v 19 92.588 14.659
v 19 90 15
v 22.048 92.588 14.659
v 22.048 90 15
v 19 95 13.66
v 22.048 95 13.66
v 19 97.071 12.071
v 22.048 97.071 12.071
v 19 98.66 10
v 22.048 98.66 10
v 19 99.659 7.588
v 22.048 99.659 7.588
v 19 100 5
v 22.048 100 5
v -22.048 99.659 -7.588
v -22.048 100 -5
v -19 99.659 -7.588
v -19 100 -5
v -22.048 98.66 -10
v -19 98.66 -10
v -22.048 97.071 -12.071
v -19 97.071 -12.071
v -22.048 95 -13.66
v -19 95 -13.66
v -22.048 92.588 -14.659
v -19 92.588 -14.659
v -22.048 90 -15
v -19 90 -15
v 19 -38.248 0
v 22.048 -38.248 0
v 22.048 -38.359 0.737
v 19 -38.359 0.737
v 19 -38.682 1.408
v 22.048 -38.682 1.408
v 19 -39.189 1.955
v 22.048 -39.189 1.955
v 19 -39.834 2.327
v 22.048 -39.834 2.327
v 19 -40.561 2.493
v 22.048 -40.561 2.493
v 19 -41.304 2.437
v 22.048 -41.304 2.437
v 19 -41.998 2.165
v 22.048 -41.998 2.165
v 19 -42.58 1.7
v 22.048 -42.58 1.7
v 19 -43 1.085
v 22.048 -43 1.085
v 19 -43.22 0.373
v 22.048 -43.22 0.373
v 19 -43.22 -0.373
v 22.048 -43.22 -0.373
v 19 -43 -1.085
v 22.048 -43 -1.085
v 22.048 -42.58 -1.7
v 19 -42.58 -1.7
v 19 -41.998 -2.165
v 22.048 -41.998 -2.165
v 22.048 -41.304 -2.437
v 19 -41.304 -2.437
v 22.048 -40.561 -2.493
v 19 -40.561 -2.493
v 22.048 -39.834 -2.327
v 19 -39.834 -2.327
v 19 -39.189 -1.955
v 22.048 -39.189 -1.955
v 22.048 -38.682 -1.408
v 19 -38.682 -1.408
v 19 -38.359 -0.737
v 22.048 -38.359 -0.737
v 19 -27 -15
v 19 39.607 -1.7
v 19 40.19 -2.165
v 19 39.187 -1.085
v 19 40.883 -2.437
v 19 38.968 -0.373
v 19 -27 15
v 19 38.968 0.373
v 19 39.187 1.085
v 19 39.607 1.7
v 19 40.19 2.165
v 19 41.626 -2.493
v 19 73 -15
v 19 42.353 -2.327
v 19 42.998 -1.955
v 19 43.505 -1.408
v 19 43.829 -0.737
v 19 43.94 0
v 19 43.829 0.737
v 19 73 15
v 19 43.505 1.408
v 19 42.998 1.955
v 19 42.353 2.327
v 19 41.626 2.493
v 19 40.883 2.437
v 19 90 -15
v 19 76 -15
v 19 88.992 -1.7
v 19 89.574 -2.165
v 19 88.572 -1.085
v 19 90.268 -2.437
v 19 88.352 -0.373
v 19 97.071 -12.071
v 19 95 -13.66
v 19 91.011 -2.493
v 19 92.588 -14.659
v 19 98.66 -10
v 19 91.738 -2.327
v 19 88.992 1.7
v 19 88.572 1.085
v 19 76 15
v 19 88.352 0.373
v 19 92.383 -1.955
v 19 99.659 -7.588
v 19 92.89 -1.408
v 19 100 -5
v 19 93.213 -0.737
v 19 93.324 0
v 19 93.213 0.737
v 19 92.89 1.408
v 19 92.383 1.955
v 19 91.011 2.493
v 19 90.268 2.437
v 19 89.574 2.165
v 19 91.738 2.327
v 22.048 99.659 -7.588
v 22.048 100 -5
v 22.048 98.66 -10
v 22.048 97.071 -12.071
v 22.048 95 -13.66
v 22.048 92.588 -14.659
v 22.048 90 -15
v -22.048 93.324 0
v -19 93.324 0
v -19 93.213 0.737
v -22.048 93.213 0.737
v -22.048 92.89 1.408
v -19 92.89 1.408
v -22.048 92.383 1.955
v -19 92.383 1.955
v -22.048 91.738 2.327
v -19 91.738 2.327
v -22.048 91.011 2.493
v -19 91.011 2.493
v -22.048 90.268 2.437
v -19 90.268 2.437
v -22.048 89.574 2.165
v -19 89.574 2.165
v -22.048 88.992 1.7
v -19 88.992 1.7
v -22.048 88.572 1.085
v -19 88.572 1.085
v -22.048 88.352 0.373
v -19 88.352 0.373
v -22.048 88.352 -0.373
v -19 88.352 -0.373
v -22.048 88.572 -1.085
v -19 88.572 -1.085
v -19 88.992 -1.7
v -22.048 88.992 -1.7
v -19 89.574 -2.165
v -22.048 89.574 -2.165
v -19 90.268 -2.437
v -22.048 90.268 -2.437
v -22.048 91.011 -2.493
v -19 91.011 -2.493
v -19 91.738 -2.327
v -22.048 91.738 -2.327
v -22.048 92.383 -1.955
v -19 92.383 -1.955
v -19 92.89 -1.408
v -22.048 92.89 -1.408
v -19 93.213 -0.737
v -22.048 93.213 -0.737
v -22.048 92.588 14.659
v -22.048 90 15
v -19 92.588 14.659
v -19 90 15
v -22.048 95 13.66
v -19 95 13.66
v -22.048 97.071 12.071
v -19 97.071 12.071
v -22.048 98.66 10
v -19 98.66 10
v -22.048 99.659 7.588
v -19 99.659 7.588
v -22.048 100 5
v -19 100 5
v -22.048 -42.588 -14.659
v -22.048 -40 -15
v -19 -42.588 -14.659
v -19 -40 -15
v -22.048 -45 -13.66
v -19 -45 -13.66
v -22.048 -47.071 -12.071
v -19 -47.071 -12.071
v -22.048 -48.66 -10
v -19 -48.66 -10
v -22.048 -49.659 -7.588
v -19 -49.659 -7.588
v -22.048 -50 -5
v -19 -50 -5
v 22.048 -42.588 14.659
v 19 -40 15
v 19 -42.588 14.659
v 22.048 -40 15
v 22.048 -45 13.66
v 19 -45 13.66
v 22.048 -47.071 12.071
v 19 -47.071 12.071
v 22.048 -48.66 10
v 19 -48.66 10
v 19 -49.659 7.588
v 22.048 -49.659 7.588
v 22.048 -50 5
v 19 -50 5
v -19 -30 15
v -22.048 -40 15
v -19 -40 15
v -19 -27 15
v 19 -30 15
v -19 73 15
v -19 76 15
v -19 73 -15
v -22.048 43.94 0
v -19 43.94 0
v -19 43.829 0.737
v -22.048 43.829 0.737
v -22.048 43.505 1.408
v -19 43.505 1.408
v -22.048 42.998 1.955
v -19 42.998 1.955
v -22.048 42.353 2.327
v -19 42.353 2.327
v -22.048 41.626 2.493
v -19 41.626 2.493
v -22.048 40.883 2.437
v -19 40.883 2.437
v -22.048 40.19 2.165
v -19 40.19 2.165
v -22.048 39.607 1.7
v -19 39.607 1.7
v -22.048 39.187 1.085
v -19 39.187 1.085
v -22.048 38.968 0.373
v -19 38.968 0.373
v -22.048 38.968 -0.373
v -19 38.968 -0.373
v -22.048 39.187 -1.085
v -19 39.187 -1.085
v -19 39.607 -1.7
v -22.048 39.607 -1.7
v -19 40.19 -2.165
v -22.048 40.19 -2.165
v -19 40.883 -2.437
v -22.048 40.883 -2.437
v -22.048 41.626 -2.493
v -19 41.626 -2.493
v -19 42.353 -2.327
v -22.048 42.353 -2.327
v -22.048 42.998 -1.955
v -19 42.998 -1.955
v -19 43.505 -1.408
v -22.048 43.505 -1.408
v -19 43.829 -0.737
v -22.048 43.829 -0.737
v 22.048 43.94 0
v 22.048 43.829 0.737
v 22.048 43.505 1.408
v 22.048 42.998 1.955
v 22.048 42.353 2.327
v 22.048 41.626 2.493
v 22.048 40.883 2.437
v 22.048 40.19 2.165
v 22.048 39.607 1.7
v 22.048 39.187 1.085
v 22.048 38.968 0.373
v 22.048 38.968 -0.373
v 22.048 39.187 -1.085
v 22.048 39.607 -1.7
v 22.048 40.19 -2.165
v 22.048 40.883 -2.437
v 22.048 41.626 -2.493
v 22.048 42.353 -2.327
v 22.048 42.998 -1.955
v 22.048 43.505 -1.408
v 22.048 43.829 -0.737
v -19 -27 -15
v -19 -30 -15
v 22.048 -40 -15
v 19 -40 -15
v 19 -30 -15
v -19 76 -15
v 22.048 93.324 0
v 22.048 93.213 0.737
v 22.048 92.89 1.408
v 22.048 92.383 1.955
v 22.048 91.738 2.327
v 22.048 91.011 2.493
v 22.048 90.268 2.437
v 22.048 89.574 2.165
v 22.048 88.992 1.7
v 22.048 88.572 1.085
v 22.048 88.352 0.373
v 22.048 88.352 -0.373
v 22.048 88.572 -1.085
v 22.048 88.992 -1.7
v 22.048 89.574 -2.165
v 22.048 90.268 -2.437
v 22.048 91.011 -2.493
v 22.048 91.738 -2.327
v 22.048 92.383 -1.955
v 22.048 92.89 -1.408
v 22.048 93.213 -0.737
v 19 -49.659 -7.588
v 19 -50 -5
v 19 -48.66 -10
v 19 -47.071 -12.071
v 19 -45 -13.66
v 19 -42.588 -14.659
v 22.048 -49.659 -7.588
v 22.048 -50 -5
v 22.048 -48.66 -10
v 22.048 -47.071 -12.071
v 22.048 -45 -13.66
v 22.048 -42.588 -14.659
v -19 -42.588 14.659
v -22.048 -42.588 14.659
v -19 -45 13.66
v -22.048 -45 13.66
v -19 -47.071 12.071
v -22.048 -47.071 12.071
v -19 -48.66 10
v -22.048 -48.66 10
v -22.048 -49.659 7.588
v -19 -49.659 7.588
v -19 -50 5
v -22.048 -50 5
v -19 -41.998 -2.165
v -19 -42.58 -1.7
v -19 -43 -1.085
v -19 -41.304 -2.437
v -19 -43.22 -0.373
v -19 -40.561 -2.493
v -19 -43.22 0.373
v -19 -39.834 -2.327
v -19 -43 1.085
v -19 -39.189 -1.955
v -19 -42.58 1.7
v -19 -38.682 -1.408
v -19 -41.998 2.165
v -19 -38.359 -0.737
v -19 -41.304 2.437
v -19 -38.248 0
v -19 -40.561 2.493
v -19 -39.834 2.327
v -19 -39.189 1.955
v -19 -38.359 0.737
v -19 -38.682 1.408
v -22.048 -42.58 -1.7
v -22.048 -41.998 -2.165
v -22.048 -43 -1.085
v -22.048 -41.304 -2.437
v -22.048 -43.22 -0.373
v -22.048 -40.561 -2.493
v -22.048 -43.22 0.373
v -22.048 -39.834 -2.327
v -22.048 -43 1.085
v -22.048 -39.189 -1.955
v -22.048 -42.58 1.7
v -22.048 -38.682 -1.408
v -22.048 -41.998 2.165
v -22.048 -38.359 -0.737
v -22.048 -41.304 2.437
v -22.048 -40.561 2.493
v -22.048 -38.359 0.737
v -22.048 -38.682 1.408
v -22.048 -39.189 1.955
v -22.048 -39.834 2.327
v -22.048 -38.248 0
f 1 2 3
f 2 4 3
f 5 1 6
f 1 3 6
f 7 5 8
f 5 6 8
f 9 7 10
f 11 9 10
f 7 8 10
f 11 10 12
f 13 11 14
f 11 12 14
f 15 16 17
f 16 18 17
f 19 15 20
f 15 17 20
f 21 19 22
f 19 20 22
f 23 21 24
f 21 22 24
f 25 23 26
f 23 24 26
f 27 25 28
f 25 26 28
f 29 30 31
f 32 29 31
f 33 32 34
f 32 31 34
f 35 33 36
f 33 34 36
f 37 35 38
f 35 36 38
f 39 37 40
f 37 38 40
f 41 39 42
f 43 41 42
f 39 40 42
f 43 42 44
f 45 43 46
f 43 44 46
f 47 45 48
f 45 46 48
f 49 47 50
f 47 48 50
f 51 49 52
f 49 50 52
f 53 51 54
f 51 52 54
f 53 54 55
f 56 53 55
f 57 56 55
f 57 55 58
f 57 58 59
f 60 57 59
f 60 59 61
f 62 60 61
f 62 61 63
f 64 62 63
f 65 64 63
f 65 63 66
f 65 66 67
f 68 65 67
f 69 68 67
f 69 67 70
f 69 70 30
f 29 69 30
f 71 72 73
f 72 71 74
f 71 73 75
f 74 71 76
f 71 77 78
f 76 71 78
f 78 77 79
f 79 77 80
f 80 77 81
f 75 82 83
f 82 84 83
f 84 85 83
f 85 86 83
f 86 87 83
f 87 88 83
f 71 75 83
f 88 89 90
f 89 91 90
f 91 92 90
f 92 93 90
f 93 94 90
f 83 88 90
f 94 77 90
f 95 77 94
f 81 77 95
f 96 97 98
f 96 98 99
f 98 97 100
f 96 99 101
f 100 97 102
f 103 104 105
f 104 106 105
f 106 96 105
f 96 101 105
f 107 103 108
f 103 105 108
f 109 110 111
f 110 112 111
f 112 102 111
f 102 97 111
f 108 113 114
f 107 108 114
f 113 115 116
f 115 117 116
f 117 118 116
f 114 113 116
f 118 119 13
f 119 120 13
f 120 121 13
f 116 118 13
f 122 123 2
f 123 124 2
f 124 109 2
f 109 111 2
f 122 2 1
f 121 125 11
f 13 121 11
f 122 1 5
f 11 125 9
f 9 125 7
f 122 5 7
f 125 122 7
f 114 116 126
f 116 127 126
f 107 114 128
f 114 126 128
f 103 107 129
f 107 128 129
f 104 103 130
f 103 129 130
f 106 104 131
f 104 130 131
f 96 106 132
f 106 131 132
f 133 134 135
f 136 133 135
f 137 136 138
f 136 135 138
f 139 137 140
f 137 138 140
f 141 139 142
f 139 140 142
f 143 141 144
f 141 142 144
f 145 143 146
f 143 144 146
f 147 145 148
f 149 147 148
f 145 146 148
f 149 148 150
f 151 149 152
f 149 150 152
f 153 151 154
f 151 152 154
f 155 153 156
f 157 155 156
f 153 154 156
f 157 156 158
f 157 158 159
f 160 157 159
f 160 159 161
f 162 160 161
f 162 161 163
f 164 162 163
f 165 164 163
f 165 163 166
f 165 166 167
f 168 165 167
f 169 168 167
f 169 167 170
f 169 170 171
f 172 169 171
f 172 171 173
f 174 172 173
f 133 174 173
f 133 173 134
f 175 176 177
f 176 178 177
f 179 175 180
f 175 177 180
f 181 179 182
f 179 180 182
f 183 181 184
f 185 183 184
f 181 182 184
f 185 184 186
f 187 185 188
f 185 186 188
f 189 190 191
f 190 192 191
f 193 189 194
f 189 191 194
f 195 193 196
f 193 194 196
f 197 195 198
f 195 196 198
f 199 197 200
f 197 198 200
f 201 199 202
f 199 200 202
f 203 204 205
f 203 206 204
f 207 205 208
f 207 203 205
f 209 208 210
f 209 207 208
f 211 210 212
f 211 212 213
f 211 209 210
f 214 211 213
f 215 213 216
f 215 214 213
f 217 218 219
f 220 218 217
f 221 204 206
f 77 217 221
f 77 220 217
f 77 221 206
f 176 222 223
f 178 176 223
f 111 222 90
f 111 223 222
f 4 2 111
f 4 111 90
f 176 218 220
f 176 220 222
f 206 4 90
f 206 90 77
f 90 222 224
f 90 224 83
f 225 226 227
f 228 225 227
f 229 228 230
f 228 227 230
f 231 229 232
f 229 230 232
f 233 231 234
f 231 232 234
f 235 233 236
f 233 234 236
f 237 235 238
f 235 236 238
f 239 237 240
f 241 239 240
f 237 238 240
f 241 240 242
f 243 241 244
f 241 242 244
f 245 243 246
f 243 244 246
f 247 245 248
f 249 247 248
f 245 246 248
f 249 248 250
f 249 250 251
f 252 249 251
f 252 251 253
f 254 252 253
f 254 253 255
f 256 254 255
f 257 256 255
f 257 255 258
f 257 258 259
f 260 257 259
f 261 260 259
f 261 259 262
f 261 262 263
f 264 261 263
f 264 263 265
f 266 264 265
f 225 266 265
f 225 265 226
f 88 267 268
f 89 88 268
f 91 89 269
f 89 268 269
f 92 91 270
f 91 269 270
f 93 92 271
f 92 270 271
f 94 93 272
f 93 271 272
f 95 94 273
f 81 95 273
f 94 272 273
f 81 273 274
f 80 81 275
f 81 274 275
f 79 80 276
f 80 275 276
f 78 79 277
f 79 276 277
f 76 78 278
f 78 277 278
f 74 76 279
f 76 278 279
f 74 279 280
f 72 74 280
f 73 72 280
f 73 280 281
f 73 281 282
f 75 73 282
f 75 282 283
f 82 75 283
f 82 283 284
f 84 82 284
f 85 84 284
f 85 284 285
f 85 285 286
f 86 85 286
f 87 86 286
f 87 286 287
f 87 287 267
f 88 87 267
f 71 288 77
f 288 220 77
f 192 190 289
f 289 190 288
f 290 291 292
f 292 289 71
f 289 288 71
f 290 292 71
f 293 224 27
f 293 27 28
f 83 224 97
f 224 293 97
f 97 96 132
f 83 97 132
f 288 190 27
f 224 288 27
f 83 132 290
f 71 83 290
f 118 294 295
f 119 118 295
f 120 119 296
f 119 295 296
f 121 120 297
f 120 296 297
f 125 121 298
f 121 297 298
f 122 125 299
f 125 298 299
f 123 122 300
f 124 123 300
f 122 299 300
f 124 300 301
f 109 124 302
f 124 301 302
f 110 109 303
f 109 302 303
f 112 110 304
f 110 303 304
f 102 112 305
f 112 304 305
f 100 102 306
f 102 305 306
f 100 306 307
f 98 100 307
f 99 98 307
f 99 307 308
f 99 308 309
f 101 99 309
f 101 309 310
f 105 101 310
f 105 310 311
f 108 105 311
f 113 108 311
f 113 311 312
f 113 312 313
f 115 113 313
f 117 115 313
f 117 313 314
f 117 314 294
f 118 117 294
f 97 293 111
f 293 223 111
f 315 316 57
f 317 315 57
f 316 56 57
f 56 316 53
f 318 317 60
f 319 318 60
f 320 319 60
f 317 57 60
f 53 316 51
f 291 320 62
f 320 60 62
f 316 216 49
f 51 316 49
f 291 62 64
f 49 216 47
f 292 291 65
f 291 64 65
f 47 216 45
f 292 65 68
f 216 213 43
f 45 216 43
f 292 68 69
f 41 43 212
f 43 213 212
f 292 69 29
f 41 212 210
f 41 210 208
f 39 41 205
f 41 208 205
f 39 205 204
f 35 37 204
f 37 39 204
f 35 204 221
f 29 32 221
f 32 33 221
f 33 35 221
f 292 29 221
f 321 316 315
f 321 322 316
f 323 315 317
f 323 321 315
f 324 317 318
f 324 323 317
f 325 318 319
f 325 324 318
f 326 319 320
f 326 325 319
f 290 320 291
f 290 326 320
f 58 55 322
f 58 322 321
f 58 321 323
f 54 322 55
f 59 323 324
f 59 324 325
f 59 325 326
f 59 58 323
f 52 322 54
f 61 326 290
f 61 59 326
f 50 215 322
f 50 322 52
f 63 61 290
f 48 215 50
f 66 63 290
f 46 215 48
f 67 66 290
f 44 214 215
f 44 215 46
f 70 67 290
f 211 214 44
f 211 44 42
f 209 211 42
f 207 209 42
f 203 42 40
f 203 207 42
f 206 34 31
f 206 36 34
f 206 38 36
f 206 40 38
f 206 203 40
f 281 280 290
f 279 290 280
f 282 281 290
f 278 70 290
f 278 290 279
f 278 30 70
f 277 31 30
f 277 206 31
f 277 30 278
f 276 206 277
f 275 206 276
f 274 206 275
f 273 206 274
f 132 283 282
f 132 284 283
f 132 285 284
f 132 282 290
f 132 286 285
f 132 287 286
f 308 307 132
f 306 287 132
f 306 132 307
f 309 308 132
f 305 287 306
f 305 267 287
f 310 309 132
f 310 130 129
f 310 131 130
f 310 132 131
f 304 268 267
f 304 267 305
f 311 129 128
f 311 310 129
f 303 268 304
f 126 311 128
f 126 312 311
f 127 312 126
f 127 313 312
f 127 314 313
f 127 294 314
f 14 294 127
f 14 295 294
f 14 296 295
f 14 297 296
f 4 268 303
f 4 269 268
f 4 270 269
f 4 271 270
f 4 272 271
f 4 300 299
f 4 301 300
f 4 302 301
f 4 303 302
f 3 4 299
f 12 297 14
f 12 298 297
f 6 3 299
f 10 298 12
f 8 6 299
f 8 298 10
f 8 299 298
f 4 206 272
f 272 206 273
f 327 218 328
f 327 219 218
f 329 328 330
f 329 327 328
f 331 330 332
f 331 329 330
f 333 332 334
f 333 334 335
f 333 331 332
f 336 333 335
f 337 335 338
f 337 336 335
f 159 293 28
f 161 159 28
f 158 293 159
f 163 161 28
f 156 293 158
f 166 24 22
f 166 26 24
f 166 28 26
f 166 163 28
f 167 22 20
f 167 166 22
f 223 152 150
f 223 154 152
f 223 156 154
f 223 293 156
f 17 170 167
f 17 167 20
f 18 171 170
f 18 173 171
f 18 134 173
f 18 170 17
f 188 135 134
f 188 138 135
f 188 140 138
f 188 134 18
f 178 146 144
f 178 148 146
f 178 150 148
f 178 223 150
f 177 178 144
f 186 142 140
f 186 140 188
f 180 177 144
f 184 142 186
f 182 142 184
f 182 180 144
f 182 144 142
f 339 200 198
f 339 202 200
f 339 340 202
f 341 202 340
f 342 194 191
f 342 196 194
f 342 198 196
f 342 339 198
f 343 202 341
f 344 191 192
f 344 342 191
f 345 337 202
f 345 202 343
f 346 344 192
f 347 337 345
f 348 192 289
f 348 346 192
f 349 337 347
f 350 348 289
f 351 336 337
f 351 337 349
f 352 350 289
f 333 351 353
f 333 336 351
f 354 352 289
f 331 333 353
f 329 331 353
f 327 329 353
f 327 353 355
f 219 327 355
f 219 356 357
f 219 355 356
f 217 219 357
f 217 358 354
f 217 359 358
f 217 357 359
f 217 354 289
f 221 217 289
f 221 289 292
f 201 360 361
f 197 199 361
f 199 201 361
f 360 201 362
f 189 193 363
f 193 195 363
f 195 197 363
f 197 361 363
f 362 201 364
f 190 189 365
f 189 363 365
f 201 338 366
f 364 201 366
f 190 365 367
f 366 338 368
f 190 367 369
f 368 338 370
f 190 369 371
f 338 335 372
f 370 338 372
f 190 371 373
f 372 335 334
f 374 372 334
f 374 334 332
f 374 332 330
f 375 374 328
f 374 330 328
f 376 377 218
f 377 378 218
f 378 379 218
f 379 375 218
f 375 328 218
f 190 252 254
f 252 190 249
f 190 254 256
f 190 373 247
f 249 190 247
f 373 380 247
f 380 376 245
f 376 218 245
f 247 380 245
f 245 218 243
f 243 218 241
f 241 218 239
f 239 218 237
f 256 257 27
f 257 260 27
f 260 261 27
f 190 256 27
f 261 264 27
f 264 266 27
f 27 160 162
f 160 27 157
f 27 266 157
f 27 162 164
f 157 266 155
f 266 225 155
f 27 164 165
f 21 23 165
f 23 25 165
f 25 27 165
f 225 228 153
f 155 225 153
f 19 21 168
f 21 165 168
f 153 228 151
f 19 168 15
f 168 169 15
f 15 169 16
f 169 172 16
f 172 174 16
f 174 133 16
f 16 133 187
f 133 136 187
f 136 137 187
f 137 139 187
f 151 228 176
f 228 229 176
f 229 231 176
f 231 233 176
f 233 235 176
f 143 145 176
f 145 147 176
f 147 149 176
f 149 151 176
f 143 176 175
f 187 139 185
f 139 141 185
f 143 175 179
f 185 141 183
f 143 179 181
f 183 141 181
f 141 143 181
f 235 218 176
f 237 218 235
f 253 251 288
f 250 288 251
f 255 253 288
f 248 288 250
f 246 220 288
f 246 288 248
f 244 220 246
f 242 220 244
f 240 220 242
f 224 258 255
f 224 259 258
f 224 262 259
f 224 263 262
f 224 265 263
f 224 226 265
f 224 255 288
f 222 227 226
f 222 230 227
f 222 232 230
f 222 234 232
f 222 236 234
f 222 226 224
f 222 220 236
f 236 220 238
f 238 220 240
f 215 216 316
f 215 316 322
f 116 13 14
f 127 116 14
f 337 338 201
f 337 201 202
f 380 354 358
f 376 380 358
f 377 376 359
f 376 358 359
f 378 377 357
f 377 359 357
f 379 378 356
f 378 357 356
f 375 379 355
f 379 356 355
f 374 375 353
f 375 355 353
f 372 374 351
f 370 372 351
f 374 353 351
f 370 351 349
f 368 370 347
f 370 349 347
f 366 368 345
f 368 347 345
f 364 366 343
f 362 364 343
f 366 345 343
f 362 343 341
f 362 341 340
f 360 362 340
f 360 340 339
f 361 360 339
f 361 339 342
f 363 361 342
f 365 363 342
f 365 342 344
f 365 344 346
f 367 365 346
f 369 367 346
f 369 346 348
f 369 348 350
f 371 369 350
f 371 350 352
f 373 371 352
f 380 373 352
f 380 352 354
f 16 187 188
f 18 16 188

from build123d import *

# Parameters (mm, degrees)
SKETCH1_W           = 3.047619048
SKETCH1_H           = 150
SKETCH1_W_2         = 38
SKETCH1_H_2         = 3
BOSS_EXTRUDE1_DEPTH = 15
FILLET1_R           = 10
SKETCH2_R           = 2.5
CUT_EXTRUDE1_DEPTH  = 61
SKETCH3_R           = 2.5
CUT_EXTRUDE2_DEPTH  = 55


with BuildPart() as part:
    # Sketch1 → Boss-Extrude1 (new, symmetric)
    with BuildSketch(Plane.XY):
        with Locations((-20.523809524, 25)):
            Rectangle(SKETCH1_W, SKETCH1_H)
        with Locations((20.523809524, 25)):
            Rectangle(SKETCH1_W, SKETCH1_H)
        with Locations((0, 74.5)):
            Rectangle(SKETCH1_W_2, SKETCH1_H_2)
        with Locations((0, -28.5)):
            Rectangle(SKETCH1_W_2, SKETCH1_H_2)
    extrude(amount=BOSS_EXTRUDE1_DEPTH, both=True)

    # Fillet1
    fillet1_edges = [part.edges().sort_by_distance(p)[0] for p in [
        (-20.523809524, -50, -15),
        (20.523809524, -50, -15),
        (20.523809524, -50, 15),
        (-20.523809524, -50, 15),
        (-20.523809524, 100, 15),
        (-20.523809524, 100, -15),
        (20.523809524, 100, -15),
        (20.523809524, 100, 15),
    ]]
    fillet(fillet1_edges, radius=FILLET1_R)

    # Sketch2 → Cut-Extrude1 (cut)
    with BuildSketch(Plane(origin=(22.047619048, 0, 0), x_dir=(0, 0, -1), z_dir=(1, 0, 0))):
        with Locations(Location((0, 41.439583657, 0), (0, 0, 90))):
            Circle(SKETCH2_R)
        with Locations(Location((0, -40.747770908, 0), (0, 0, 90))):
            Circle(SKETCH2_R)
    extrude(amount=-CUT_EXTRUDE1_DEPTH, mode=Mode.SUBTRACT)

    # Sketch3 → Cut-Extrude2 (cut)
    with BuildSketch(Plane(origin=(22.047619048, 0, 0), x_dir=(0, 0, -1), z_dir=(1, 0, 0))):
        with Locations(Location((0, 90.824457964, 0), (0, 0, 90))):
            Circle(SKETCH3_R)
    extrude(amount=-CUT_EXTRUDE2_DEPTH, mode=Mode.SUBTRACT)


solid = part.part
